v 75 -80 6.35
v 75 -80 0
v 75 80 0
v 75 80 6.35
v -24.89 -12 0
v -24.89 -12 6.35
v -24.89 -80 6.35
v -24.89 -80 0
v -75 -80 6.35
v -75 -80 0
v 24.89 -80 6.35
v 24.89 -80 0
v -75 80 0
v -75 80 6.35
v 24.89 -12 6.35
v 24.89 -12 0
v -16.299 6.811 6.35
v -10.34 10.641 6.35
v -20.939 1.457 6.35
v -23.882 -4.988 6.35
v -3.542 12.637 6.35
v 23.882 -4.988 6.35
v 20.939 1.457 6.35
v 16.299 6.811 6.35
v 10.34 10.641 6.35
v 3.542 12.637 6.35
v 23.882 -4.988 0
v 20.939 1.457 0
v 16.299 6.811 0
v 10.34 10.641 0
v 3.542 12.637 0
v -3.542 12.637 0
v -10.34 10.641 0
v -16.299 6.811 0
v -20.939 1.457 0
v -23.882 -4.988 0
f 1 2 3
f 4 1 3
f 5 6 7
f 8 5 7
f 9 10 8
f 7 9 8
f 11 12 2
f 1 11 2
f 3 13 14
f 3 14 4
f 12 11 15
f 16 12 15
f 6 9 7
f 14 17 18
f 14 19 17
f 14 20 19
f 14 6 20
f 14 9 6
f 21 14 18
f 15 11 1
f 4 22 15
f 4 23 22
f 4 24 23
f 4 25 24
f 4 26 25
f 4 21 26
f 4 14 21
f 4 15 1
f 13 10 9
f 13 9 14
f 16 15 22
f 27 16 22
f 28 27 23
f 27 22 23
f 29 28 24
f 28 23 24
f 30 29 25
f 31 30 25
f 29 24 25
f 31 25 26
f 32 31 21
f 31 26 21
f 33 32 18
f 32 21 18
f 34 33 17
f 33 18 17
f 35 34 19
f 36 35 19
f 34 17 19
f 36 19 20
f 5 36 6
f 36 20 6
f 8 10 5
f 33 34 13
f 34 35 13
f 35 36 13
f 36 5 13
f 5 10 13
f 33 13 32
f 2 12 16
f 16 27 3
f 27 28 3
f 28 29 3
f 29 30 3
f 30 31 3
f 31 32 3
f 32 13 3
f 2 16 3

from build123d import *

# Parameters (mm, degrees)
SKETCH1_W           = 150
SKETCH1_H           = 160
BOSS_EXTRUDE1_DEPTH = 6.35
CUT_EXTRUDE1_REACH  = 111.842


with BuildPart() as part:
    # Sketch1 → Boss-Extrude1 (new body)
    with BuildSketch(Plane.XY):
        Rectangle(SKETCH1_W, SKETCH1_H)
    extrude(amount=BOSS_EXTRUDE1_DEPTH)

    # Sketch2 → Cut-Extrude1 (cut, up to next)
    with BuildSketch(Plane.XY.offset(6.35), mode=Mode.PRIVATE) as cut_extrude1_sk1:
        with BuildLine():
            Line((-24.89, -12), (-24.89, -80))
            Line((-24.89, -80), (24.89, -80))
            Line((24.89, -80), (24.89, -12))
            ThreePointArc((24.89, -12), (0, 12.89), (-24.89, -12))
        make_face()
    cut_extrude1_tool1 = extrude(cut_extrude1_sk1.sketch, amount=-CUT_EXTRUDE1_REACH, mode=Mode.PRIVATE) & part.part
    add(cut_extrude1_tool1.solids().sort_by_distance((0, -36.049464, 6.35))[0], mode=Mode.SUBTRACT)


solid = part.part
